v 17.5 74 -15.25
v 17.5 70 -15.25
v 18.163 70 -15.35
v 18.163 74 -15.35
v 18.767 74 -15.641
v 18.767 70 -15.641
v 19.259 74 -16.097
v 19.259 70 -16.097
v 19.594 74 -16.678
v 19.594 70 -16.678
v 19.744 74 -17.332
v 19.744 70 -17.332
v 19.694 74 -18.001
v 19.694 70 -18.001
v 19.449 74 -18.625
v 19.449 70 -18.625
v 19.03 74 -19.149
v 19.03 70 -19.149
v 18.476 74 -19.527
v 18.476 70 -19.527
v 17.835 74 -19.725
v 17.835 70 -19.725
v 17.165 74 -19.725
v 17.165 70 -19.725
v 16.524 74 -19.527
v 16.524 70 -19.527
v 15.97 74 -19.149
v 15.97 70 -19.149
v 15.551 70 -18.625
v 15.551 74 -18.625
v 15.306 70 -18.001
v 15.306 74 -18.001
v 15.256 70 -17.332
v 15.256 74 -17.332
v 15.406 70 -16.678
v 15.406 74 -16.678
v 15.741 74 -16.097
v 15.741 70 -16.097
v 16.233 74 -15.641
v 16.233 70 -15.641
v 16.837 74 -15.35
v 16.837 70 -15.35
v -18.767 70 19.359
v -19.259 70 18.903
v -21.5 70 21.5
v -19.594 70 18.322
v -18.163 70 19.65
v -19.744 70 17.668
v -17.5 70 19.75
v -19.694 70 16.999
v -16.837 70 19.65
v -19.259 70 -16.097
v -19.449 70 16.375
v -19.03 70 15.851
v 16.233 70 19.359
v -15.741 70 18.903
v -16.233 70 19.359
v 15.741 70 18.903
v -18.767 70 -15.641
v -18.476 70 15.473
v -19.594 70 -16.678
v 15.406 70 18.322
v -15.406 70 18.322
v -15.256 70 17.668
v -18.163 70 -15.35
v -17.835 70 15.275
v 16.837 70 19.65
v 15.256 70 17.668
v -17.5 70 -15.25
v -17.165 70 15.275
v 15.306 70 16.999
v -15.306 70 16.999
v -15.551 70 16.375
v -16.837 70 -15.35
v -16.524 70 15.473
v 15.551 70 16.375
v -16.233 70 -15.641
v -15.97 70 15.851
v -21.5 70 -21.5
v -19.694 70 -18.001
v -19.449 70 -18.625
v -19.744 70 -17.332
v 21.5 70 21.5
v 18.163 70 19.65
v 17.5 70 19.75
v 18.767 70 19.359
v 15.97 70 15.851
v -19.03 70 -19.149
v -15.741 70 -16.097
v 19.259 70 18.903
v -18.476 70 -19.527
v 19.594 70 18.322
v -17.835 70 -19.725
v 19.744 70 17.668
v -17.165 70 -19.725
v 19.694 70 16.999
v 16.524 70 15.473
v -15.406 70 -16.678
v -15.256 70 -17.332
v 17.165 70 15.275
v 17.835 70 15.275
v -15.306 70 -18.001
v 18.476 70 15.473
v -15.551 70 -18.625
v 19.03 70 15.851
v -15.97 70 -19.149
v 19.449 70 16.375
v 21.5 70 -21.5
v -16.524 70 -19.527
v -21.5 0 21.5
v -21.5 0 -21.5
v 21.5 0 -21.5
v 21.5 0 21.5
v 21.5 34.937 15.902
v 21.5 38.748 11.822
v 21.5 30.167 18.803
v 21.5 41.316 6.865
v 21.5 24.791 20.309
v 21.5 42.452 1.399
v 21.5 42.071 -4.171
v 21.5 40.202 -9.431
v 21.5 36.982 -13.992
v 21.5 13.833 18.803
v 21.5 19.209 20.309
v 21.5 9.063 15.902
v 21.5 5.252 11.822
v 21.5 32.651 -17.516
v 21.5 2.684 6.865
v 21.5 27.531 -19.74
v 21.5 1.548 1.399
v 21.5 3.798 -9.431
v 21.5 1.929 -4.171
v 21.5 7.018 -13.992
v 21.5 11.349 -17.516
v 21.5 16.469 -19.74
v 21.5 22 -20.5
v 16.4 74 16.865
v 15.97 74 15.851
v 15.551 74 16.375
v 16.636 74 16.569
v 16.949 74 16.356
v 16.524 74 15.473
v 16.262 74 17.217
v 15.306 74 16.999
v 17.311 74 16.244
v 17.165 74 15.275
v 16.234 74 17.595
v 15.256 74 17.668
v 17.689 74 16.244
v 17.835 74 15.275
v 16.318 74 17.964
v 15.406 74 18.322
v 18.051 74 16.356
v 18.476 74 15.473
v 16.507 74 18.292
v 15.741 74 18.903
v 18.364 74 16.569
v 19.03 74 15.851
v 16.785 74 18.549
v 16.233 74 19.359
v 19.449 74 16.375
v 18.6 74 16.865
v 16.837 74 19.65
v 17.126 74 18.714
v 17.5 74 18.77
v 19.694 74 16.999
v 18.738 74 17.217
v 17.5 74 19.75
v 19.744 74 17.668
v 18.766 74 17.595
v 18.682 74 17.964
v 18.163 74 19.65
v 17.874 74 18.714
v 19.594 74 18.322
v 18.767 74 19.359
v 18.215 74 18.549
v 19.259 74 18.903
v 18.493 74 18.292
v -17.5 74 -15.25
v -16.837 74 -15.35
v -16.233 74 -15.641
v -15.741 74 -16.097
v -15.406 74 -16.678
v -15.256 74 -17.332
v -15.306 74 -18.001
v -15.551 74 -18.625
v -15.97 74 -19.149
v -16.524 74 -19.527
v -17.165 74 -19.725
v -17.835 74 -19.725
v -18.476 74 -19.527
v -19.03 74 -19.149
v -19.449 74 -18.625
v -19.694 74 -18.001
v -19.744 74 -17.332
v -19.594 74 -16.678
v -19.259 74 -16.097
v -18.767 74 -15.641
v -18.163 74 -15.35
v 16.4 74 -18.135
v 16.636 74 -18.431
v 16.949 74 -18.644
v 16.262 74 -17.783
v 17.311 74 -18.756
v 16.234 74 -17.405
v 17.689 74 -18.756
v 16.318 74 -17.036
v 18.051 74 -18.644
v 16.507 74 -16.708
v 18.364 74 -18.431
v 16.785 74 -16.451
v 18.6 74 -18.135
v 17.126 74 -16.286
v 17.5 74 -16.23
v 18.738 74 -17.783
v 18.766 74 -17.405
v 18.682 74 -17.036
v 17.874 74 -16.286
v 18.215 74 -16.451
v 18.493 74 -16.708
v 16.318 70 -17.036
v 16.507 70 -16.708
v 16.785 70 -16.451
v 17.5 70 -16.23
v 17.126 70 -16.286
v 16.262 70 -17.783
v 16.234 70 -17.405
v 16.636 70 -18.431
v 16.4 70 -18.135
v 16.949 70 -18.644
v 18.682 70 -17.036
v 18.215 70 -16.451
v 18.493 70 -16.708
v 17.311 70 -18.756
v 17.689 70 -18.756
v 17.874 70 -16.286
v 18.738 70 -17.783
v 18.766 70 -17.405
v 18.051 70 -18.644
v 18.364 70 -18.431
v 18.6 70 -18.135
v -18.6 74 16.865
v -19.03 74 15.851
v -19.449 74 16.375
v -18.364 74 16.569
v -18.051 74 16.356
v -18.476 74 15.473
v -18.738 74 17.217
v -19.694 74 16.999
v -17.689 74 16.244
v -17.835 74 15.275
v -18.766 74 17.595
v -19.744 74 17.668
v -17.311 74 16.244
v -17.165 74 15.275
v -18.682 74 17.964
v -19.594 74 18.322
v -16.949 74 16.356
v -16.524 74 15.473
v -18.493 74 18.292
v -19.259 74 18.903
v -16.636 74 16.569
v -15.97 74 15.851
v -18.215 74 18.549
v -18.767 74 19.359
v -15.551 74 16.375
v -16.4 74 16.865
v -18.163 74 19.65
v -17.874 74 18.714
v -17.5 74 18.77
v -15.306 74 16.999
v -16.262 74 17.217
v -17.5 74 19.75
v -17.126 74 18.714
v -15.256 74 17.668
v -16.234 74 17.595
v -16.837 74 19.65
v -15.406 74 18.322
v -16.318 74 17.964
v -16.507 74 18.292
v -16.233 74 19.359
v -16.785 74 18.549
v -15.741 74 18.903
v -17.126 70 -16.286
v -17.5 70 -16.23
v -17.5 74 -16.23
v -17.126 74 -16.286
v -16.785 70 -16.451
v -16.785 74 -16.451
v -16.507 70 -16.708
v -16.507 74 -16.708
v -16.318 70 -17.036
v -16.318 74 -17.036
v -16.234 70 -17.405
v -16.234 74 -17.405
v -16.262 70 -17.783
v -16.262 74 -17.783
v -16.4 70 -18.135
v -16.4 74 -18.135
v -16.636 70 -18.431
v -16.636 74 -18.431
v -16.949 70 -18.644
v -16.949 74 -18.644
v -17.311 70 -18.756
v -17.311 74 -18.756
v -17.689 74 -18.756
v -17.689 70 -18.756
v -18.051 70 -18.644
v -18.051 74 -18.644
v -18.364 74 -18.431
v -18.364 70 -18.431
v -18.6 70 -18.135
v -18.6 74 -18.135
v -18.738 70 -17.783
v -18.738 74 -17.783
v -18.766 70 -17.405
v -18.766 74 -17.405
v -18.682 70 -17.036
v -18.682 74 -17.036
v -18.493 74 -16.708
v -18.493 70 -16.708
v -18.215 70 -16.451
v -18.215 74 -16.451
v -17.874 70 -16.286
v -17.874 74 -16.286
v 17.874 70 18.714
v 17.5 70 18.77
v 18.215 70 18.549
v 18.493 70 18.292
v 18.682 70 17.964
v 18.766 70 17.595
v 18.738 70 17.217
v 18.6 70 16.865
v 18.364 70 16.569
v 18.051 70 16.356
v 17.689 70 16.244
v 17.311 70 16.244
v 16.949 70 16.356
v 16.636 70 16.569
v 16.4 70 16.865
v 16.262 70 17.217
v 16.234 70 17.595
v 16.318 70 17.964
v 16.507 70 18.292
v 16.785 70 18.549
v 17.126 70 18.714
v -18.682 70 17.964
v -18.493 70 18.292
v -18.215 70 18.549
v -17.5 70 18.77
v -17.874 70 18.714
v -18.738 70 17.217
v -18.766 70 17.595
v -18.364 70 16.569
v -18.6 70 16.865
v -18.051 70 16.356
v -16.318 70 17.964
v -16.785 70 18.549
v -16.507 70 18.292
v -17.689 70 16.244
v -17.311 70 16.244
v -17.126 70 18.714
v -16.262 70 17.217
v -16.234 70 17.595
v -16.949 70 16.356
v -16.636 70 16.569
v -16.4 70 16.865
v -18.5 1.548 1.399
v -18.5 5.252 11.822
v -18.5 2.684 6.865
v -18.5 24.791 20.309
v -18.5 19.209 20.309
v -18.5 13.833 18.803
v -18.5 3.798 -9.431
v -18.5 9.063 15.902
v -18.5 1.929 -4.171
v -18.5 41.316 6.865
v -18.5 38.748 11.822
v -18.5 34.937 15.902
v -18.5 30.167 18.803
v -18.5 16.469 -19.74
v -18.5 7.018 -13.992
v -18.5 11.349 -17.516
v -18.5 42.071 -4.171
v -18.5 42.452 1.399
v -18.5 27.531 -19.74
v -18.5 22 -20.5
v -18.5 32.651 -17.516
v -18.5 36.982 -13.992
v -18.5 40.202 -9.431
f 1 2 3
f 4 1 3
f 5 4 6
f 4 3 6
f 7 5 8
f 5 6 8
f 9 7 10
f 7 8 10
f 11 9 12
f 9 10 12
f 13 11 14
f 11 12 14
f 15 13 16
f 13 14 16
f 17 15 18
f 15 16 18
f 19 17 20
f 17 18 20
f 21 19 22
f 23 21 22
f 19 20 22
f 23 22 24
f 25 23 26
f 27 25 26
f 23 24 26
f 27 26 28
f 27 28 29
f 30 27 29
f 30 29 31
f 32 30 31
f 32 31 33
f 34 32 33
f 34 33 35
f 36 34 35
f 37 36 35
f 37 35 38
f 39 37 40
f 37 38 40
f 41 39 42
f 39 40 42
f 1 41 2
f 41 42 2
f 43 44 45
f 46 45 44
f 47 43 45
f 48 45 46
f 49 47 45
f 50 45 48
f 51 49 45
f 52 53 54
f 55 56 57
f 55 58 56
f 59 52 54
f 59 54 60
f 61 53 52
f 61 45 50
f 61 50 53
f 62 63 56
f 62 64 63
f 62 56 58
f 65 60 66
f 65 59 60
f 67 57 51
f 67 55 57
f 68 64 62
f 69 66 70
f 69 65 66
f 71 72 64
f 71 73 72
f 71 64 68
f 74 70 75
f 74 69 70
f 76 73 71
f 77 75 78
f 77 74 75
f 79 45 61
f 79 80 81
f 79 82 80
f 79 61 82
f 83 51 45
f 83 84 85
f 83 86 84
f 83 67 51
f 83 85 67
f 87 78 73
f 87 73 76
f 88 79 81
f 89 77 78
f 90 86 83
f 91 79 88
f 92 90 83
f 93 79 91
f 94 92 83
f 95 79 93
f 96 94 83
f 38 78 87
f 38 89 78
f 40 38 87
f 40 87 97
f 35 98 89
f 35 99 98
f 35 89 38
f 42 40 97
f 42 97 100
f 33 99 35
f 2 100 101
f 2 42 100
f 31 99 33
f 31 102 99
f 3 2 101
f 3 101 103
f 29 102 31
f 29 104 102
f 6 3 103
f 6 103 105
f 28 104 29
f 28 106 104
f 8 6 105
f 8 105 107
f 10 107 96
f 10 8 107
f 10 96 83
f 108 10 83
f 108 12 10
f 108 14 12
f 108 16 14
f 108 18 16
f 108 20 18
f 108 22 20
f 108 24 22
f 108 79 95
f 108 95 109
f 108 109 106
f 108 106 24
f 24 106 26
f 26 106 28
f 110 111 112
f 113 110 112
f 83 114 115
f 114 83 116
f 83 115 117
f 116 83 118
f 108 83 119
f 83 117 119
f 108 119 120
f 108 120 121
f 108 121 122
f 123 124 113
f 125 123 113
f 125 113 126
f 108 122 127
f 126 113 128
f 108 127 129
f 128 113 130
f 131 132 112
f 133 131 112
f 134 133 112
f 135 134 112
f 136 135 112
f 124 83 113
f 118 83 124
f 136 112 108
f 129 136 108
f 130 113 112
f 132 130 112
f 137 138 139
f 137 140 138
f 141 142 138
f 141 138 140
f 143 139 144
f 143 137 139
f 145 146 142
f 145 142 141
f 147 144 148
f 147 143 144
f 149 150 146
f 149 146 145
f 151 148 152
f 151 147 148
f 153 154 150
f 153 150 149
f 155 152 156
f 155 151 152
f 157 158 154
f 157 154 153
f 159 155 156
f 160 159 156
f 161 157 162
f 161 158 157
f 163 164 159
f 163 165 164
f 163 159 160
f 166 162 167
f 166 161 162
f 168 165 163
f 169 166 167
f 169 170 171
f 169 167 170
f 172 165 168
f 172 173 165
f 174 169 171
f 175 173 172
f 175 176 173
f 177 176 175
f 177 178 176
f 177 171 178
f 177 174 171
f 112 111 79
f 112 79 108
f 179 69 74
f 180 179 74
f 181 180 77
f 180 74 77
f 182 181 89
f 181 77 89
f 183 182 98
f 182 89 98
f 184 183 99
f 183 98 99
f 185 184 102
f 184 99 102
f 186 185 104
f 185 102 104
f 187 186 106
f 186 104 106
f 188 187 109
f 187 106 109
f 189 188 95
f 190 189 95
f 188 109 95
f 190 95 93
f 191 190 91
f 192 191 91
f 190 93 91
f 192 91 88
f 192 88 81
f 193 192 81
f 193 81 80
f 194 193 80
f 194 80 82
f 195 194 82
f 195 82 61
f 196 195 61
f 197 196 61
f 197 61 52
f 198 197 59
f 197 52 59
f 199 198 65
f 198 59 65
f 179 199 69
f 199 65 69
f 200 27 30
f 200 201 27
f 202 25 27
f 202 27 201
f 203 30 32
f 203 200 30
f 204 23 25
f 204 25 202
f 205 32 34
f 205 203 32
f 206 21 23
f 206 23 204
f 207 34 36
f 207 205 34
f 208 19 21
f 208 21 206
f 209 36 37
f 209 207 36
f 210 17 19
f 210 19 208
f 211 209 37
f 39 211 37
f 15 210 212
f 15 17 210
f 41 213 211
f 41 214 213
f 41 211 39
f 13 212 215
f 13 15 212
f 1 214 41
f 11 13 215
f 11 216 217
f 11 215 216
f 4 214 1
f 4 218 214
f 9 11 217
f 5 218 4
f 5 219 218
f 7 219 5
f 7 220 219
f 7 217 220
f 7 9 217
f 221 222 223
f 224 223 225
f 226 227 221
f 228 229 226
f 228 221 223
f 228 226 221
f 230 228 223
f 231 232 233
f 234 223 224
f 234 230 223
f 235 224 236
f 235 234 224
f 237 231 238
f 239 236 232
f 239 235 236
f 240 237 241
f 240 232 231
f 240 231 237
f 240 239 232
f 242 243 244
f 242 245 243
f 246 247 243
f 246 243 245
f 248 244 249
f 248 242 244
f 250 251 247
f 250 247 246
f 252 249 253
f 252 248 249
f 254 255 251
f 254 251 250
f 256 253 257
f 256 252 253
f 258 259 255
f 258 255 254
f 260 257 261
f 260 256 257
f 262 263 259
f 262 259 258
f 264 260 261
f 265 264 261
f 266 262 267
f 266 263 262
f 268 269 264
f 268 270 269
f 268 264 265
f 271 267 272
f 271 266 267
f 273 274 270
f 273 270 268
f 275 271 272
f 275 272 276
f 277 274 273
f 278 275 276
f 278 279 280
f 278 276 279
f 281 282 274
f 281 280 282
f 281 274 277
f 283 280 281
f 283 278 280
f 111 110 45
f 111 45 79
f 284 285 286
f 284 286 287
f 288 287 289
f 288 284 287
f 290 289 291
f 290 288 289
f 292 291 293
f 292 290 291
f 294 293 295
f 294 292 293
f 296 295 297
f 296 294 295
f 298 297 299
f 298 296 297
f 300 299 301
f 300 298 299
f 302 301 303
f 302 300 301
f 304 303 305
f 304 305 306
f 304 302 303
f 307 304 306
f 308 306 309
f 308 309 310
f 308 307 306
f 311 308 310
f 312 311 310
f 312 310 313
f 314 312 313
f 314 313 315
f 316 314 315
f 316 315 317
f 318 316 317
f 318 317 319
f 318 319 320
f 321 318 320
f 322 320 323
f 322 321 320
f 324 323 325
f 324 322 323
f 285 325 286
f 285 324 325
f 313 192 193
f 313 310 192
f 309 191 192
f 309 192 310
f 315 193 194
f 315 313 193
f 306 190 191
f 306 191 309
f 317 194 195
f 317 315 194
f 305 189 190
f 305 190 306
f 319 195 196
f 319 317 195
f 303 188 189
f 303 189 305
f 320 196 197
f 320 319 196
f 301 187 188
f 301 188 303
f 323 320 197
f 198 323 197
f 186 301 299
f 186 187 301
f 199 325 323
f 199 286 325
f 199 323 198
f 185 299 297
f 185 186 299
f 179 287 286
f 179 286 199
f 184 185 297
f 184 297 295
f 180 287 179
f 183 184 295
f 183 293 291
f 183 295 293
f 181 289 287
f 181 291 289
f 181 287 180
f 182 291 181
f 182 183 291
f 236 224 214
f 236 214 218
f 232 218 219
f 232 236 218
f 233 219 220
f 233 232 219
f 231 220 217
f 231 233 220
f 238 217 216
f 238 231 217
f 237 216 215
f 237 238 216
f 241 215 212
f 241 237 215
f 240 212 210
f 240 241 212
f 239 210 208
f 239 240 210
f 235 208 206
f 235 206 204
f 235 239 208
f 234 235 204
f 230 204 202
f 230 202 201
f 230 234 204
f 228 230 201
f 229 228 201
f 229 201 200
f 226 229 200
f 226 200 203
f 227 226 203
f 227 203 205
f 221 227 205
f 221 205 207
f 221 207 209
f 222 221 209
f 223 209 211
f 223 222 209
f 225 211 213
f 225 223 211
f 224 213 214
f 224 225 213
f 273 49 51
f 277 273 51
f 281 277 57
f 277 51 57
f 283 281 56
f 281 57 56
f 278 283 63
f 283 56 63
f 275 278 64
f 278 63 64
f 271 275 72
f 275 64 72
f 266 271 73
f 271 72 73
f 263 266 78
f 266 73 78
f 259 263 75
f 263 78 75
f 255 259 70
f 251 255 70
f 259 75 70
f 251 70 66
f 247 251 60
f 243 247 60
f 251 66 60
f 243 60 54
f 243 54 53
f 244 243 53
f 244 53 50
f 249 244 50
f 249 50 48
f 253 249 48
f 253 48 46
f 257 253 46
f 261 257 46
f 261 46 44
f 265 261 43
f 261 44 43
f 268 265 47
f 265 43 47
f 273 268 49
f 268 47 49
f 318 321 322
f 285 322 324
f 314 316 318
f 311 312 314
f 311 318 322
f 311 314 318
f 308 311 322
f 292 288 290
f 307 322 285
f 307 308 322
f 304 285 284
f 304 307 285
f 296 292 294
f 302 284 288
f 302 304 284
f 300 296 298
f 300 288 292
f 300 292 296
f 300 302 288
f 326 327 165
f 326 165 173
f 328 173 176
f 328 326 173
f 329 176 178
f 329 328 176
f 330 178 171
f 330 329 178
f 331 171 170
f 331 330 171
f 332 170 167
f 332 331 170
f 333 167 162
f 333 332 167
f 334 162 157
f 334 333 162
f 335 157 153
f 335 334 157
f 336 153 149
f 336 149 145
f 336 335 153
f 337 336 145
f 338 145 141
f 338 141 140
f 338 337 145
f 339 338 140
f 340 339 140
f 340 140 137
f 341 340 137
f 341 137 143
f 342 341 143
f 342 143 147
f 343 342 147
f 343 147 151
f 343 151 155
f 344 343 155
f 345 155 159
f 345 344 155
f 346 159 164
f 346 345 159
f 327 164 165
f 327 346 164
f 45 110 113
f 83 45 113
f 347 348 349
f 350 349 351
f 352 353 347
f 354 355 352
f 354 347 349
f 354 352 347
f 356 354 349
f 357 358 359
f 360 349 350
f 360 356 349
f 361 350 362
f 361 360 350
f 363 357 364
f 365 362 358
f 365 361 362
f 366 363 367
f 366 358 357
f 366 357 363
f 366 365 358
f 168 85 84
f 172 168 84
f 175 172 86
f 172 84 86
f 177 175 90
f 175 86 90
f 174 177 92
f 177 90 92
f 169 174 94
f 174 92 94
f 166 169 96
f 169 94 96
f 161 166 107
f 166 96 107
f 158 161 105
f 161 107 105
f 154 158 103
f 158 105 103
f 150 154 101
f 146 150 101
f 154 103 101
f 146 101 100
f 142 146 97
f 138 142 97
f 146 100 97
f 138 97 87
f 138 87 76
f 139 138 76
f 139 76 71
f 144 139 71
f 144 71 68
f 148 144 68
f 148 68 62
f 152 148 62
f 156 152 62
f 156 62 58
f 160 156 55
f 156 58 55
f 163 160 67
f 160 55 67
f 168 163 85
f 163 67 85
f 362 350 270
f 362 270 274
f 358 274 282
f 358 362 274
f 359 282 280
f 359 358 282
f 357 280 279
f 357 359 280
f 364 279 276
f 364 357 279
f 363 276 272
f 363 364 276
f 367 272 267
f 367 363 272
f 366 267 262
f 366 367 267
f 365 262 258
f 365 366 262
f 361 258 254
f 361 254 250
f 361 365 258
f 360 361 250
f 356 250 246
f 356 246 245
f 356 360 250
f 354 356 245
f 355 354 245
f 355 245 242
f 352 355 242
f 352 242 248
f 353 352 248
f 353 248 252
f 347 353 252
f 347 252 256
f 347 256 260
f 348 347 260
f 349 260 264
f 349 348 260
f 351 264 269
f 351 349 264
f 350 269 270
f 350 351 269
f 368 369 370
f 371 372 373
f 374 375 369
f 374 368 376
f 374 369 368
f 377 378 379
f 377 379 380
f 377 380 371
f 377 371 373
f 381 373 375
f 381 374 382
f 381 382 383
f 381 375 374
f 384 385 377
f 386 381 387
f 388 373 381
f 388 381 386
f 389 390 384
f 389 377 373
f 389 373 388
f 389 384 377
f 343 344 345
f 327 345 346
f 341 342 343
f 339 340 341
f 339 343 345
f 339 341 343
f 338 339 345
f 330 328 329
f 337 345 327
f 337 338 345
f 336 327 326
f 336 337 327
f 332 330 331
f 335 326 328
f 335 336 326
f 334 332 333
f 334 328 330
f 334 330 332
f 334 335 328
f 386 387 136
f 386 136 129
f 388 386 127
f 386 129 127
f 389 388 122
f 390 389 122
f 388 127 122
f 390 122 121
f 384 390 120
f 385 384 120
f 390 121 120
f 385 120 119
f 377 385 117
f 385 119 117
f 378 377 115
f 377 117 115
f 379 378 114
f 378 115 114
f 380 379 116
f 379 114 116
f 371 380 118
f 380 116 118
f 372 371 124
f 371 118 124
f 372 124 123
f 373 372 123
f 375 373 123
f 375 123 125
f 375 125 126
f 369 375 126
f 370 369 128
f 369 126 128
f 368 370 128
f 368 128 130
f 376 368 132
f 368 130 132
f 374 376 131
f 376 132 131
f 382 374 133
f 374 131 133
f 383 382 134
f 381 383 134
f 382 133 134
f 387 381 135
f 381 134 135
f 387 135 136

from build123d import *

# Parameters (mm, degrees)
SKETCH1_W           = 43
SKETCH1_H           = 43
BOSS_EXTRUDE1_DEPTH = 70
SKETCH2_R           = 20.5
CUT_EXTRUDE1_DEPTH  = 40
SKETCH3_R           = 2.25
SKETCH3_R_2         = 1.27
BOSS_EXTRUDE2_DEPTH = 4


with BuildPart() as part:
    # Sketch1 → Boss-Extrude1 (new body)
    with BuildSketch(Plane(origin=(0, 0, 0), x_dir=(1, 0, 0), z_dir=(0, 1, 0))):
        Rectangle(SKETCH1_W, SKETCH1_H)
    extrude(amount=BOSS_EXTRUDE1_DEPTH)

    # Sketch2 → Cut-Extrude1 (cut)
    with BuildSketch(Plane(origin=(21.5, 0, 0), x_dir=(0, 0, -1), z_dir=(1, 0, 0))):
        with Locations((0, 22)):
            Circle(SKETCH2_R)
    extrude(amount=-CUT_EXTRUDE1_DEPTH, mode=Mode.SUBTRACT)

    # Sketch3 → Boss-Extrude2 (add)
    # profile 1 of 4: a face of its own
    with BuildSketch(Plane(origin=(0, 70, 0), x_dir=(1, 0, 0), z_dir=(0, 1, 0))):
        with Locations(Location((17.5, 17.5, 0), (0, 0, 270))):
            Circle(SKETCH3_R)
        with Locations(Location((17.5, 17.5, 0), (0, 0, 270))):
            Circle(SKETCH3_R_2, mode=Mode.SUBTRACT)
    # profile 2 of 4: a face of its own
    with BuildSketch(Plane(origin=(0, 70, 0), x_dir=(1, 0, 0), z_dir=(0, 1, 0))):
        with Locations(Location((-17.5, 17.5, 0), (0, 0, 270))):
            Circle(SKETCH3_R)
        with Locations(Location((-17.5, 17.5, 0), (0, 0, 270))):
            Circle(SKETCH3_R_2, mode=Mode.SUBTRACT)
    # profile 3 of 4: a face of its own
    with BuildSketch(Plane(origin=(0, 70, 0), x_dir=(1, 0, 0), z_dir=(0, 1, 0))):
        with Locations(Location((-17.5, -17.5, 0), (0, 0, 270))):
            Circle(SKETCH3_R)
        with Locations(Location((-17.5, -17.5, 0), (0, 0, 270))):
            Circle(SKETCH3_R_2, mode=Mode.SUBTRACT)
    # profile 4 of 4: a face of its own
    with BuildSketch(Plane(origin=(0, 70, 0), x_dir=(1, 0, 0), z_dir=(0, 1, 0))):
        with Locations(Location((17.5, -17.5, 0), (0, 0, 270))):
            Circle(SKETCH3_R)
        with Locations(Location((17.5, -17.5, 0), (0, 0, 270))):
            Circle(SKETCH3_R_2, mode=Mode.SUBTRACT)
    extrude(amount=BOSS_EXTRUDE2_DEPTH)


solid = part.part
